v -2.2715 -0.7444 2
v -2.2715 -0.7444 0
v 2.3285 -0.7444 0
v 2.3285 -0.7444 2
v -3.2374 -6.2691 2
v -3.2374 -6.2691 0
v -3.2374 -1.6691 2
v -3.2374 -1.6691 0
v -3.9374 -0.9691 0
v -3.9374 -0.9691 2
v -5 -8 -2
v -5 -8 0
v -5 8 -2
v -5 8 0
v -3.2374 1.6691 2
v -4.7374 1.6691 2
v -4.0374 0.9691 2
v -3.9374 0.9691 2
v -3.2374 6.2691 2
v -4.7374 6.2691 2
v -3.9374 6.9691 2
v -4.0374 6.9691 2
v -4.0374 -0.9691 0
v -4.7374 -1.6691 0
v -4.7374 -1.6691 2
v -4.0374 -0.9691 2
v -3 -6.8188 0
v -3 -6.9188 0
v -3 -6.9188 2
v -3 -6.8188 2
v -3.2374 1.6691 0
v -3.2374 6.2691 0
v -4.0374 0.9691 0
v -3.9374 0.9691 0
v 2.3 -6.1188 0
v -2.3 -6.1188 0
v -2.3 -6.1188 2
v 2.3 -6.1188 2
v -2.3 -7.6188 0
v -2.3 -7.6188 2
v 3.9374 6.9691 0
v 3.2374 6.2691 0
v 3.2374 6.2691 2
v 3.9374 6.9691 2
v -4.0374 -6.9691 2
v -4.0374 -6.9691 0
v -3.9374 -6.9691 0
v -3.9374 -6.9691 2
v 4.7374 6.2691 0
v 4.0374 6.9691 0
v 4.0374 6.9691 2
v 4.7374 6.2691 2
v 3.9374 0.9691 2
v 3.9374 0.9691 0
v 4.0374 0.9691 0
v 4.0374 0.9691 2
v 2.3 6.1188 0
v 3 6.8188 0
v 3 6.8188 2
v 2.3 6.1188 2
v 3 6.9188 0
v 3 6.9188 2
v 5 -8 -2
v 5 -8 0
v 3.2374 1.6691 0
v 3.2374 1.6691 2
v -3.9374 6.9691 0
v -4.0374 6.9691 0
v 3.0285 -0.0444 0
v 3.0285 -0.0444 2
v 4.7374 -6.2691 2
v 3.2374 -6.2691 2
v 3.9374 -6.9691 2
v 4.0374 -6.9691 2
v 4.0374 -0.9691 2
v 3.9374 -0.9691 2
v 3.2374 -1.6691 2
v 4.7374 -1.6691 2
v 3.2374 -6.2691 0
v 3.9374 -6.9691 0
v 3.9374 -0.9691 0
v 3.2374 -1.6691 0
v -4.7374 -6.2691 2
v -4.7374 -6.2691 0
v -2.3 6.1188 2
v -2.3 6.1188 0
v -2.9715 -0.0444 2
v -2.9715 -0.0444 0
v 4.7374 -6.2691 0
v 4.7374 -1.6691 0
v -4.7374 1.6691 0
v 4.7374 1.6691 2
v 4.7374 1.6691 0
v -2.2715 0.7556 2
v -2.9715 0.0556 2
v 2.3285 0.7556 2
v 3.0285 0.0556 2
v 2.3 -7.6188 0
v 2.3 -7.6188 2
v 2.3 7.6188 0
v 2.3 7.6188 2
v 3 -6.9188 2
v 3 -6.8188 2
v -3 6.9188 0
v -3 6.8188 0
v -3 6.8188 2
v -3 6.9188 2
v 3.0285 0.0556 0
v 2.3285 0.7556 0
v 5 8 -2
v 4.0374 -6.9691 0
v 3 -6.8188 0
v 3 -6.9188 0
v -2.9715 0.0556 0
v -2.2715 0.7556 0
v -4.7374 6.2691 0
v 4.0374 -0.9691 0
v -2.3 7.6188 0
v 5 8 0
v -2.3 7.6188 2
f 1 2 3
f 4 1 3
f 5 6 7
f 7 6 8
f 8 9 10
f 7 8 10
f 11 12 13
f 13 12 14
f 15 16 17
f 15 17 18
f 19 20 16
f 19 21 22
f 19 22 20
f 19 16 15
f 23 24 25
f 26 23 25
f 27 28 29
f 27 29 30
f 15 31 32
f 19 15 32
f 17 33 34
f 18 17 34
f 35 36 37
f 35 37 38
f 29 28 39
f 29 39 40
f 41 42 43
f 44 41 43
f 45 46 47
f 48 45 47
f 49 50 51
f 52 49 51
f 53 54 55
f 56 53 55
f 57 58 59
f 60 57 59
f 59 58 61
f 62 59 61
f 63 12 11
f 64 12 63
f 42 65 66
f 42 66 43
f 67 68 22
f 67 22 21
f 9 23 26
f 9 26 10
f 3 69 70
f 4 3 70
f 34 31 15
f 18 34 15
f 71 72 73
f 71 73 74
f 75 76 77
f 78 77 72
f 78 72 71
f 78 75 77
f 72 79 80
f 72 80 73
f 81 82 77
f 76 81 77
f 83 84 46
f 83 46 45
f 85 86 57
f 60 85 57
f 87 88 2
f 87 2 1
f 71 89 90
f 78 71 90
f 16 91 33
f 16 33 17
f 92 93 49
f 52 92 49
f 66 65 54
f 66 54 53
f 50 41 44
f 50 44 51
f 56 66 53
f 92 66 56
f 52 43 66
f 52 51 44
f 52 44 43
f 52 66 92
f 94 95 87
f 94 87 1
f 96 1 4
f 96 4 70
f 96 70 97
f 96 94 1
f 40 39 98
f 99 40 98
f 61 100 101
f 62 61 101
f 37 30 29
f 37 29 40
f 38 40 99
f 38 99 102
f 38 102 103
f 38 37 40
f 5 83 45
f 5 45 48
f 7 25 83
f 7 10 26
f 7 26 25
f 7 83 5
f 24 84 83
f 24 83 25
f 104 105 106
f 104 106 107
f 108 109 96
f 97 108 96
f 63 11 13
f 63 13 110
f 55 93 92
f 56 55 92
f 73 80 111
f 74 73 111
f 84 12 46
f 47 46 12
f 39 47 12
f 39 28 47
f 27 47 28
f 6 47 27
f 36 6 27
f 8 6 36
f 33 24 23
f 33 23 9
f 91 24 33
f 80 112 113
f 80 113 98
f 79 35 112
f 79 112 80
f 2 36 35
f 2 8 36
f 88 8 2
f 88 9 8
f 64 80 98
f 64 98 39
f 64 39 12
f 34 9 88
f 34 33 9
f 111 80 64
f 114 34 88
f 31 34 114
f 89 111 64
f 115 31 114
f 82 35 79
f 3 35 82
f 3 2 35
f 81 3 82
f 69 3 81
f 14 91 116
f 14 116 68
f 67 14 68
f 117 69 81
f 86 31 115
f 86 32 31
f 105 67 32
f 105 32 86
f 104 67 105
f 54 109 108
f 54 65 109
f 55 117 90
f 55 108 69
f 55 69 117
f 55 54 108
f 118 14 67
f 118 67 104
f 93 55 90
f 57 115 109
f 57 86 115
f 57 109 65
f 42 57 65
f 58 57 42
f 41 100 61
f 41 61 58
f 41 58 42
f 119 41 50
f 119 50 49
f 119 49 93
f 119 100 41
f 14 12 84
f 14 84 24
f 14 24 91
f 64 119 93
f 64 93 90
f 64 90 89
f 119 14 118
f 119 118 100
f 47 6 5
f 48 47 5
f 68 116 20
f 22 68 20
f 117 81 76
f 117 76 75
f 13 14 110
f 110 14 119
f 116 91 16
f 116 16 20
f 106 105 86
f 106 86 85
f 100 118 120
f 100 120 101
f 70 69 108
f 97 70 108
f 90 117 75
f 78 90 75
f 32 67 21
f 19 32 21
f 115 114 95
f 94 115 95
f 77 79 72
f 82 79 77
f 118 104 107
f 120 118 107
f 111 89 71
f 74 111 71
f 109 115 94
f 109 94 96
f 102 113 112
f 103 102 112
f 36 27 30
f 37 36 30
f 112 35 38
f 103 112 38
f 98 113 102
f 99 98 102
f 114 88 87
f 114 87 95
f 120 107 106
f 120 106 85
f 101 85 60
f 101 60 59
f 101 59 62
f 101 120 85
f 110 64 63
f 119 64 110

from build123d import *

# Parameters (mm, degrees)
F0_W     = 10
F0_H     = 16
F1_DEPTH = 2
F2_W     = 1.5
F2_H     = 6
F2_W_2   = 6
F2_H_2   = 1.5
F3_DEPTH = 2
F4_SIZE  = 0.7


with BuildPart() as f1:
    # F0 (on Top) → F1 (new body)
    with BuildSketch(Plane.XY):
        Rectangle(F0_W, F0_H)
    extrude(amount=-F1_DEPTH)

    # F2 (on face) → F3 (join)
    with BuildSketch(Plane.XY):
        with Locations((-3.987426, 3.969108)):
            Rectangle(F2_W, F2_H)
        with Locations((0, 6.868761)):
            Rectangle(F2_W_2, F2_H_2)
        with Locations((3.987426, 3.969108)):
            Rectangle(F2_W, F2_H)
        with Locations((0.028471, 0.005555)):
            Rectangle(F2_W_2, F2_H_2)
        with Locations((-3.987426, -3.969108)):
            Rectangle(F2_W, F2_H)
        with Locations((0, -6.868761)):
            Rectangle(F2_W_2, F2_H_2)
        with Locations((3.987426, -3.969108)):
            Rectangle(F2_W, F2_H)
    extrude(amount=F3_DEPTH)

    # F4
    f4_edges = [f1.edges().sort_by_distance(p)[0] for p in [
        (3, 6.118761, 1),
        (3.237426, 6.969108, 1),
        (3.237426, 0.969108, 1),
        (4.737426, 0.969108, 1),
        (3.237426, -0.969108, 1),
        (3.028471, -0.744445, 1),
        (-2.971529, -0.744445, 1),
        (-2.971529, 0.755555, 1),
        (-3.237426, 0.969108, 1),
        (-4.737426, 0.969108, 1),
        (-4.737426, 6.969108, 1),
        (-3, 6.118761, 1),
        (-3, 7.618761, 1),
        (3.237426, -6.969108, 1),
        (4.737426, -6.969108, 1),
        (3, -7.618761, 1),
        (-3, -7.618761, 1),
        (-3.237426, -6.969108, 1),
        (-4.737426, -6.969108, 1),
        (-3, -6.118761, 1),
        (-4.737426, -0.969108, 1),
        (-3.237426, -0.969108, 1),
        (3.028471, 0.755555, 1),
        (4.737426, -0.969108, 1),
        (3, -6.118761, 1),
        (4.737426, 6.969108, 1),
        (3, 7.618761, 1),
        (-3.237426, 6.969108, 1),
    ]]
    chamfer(f4_edges, length=F4_SIZE)


solid = f1.part
